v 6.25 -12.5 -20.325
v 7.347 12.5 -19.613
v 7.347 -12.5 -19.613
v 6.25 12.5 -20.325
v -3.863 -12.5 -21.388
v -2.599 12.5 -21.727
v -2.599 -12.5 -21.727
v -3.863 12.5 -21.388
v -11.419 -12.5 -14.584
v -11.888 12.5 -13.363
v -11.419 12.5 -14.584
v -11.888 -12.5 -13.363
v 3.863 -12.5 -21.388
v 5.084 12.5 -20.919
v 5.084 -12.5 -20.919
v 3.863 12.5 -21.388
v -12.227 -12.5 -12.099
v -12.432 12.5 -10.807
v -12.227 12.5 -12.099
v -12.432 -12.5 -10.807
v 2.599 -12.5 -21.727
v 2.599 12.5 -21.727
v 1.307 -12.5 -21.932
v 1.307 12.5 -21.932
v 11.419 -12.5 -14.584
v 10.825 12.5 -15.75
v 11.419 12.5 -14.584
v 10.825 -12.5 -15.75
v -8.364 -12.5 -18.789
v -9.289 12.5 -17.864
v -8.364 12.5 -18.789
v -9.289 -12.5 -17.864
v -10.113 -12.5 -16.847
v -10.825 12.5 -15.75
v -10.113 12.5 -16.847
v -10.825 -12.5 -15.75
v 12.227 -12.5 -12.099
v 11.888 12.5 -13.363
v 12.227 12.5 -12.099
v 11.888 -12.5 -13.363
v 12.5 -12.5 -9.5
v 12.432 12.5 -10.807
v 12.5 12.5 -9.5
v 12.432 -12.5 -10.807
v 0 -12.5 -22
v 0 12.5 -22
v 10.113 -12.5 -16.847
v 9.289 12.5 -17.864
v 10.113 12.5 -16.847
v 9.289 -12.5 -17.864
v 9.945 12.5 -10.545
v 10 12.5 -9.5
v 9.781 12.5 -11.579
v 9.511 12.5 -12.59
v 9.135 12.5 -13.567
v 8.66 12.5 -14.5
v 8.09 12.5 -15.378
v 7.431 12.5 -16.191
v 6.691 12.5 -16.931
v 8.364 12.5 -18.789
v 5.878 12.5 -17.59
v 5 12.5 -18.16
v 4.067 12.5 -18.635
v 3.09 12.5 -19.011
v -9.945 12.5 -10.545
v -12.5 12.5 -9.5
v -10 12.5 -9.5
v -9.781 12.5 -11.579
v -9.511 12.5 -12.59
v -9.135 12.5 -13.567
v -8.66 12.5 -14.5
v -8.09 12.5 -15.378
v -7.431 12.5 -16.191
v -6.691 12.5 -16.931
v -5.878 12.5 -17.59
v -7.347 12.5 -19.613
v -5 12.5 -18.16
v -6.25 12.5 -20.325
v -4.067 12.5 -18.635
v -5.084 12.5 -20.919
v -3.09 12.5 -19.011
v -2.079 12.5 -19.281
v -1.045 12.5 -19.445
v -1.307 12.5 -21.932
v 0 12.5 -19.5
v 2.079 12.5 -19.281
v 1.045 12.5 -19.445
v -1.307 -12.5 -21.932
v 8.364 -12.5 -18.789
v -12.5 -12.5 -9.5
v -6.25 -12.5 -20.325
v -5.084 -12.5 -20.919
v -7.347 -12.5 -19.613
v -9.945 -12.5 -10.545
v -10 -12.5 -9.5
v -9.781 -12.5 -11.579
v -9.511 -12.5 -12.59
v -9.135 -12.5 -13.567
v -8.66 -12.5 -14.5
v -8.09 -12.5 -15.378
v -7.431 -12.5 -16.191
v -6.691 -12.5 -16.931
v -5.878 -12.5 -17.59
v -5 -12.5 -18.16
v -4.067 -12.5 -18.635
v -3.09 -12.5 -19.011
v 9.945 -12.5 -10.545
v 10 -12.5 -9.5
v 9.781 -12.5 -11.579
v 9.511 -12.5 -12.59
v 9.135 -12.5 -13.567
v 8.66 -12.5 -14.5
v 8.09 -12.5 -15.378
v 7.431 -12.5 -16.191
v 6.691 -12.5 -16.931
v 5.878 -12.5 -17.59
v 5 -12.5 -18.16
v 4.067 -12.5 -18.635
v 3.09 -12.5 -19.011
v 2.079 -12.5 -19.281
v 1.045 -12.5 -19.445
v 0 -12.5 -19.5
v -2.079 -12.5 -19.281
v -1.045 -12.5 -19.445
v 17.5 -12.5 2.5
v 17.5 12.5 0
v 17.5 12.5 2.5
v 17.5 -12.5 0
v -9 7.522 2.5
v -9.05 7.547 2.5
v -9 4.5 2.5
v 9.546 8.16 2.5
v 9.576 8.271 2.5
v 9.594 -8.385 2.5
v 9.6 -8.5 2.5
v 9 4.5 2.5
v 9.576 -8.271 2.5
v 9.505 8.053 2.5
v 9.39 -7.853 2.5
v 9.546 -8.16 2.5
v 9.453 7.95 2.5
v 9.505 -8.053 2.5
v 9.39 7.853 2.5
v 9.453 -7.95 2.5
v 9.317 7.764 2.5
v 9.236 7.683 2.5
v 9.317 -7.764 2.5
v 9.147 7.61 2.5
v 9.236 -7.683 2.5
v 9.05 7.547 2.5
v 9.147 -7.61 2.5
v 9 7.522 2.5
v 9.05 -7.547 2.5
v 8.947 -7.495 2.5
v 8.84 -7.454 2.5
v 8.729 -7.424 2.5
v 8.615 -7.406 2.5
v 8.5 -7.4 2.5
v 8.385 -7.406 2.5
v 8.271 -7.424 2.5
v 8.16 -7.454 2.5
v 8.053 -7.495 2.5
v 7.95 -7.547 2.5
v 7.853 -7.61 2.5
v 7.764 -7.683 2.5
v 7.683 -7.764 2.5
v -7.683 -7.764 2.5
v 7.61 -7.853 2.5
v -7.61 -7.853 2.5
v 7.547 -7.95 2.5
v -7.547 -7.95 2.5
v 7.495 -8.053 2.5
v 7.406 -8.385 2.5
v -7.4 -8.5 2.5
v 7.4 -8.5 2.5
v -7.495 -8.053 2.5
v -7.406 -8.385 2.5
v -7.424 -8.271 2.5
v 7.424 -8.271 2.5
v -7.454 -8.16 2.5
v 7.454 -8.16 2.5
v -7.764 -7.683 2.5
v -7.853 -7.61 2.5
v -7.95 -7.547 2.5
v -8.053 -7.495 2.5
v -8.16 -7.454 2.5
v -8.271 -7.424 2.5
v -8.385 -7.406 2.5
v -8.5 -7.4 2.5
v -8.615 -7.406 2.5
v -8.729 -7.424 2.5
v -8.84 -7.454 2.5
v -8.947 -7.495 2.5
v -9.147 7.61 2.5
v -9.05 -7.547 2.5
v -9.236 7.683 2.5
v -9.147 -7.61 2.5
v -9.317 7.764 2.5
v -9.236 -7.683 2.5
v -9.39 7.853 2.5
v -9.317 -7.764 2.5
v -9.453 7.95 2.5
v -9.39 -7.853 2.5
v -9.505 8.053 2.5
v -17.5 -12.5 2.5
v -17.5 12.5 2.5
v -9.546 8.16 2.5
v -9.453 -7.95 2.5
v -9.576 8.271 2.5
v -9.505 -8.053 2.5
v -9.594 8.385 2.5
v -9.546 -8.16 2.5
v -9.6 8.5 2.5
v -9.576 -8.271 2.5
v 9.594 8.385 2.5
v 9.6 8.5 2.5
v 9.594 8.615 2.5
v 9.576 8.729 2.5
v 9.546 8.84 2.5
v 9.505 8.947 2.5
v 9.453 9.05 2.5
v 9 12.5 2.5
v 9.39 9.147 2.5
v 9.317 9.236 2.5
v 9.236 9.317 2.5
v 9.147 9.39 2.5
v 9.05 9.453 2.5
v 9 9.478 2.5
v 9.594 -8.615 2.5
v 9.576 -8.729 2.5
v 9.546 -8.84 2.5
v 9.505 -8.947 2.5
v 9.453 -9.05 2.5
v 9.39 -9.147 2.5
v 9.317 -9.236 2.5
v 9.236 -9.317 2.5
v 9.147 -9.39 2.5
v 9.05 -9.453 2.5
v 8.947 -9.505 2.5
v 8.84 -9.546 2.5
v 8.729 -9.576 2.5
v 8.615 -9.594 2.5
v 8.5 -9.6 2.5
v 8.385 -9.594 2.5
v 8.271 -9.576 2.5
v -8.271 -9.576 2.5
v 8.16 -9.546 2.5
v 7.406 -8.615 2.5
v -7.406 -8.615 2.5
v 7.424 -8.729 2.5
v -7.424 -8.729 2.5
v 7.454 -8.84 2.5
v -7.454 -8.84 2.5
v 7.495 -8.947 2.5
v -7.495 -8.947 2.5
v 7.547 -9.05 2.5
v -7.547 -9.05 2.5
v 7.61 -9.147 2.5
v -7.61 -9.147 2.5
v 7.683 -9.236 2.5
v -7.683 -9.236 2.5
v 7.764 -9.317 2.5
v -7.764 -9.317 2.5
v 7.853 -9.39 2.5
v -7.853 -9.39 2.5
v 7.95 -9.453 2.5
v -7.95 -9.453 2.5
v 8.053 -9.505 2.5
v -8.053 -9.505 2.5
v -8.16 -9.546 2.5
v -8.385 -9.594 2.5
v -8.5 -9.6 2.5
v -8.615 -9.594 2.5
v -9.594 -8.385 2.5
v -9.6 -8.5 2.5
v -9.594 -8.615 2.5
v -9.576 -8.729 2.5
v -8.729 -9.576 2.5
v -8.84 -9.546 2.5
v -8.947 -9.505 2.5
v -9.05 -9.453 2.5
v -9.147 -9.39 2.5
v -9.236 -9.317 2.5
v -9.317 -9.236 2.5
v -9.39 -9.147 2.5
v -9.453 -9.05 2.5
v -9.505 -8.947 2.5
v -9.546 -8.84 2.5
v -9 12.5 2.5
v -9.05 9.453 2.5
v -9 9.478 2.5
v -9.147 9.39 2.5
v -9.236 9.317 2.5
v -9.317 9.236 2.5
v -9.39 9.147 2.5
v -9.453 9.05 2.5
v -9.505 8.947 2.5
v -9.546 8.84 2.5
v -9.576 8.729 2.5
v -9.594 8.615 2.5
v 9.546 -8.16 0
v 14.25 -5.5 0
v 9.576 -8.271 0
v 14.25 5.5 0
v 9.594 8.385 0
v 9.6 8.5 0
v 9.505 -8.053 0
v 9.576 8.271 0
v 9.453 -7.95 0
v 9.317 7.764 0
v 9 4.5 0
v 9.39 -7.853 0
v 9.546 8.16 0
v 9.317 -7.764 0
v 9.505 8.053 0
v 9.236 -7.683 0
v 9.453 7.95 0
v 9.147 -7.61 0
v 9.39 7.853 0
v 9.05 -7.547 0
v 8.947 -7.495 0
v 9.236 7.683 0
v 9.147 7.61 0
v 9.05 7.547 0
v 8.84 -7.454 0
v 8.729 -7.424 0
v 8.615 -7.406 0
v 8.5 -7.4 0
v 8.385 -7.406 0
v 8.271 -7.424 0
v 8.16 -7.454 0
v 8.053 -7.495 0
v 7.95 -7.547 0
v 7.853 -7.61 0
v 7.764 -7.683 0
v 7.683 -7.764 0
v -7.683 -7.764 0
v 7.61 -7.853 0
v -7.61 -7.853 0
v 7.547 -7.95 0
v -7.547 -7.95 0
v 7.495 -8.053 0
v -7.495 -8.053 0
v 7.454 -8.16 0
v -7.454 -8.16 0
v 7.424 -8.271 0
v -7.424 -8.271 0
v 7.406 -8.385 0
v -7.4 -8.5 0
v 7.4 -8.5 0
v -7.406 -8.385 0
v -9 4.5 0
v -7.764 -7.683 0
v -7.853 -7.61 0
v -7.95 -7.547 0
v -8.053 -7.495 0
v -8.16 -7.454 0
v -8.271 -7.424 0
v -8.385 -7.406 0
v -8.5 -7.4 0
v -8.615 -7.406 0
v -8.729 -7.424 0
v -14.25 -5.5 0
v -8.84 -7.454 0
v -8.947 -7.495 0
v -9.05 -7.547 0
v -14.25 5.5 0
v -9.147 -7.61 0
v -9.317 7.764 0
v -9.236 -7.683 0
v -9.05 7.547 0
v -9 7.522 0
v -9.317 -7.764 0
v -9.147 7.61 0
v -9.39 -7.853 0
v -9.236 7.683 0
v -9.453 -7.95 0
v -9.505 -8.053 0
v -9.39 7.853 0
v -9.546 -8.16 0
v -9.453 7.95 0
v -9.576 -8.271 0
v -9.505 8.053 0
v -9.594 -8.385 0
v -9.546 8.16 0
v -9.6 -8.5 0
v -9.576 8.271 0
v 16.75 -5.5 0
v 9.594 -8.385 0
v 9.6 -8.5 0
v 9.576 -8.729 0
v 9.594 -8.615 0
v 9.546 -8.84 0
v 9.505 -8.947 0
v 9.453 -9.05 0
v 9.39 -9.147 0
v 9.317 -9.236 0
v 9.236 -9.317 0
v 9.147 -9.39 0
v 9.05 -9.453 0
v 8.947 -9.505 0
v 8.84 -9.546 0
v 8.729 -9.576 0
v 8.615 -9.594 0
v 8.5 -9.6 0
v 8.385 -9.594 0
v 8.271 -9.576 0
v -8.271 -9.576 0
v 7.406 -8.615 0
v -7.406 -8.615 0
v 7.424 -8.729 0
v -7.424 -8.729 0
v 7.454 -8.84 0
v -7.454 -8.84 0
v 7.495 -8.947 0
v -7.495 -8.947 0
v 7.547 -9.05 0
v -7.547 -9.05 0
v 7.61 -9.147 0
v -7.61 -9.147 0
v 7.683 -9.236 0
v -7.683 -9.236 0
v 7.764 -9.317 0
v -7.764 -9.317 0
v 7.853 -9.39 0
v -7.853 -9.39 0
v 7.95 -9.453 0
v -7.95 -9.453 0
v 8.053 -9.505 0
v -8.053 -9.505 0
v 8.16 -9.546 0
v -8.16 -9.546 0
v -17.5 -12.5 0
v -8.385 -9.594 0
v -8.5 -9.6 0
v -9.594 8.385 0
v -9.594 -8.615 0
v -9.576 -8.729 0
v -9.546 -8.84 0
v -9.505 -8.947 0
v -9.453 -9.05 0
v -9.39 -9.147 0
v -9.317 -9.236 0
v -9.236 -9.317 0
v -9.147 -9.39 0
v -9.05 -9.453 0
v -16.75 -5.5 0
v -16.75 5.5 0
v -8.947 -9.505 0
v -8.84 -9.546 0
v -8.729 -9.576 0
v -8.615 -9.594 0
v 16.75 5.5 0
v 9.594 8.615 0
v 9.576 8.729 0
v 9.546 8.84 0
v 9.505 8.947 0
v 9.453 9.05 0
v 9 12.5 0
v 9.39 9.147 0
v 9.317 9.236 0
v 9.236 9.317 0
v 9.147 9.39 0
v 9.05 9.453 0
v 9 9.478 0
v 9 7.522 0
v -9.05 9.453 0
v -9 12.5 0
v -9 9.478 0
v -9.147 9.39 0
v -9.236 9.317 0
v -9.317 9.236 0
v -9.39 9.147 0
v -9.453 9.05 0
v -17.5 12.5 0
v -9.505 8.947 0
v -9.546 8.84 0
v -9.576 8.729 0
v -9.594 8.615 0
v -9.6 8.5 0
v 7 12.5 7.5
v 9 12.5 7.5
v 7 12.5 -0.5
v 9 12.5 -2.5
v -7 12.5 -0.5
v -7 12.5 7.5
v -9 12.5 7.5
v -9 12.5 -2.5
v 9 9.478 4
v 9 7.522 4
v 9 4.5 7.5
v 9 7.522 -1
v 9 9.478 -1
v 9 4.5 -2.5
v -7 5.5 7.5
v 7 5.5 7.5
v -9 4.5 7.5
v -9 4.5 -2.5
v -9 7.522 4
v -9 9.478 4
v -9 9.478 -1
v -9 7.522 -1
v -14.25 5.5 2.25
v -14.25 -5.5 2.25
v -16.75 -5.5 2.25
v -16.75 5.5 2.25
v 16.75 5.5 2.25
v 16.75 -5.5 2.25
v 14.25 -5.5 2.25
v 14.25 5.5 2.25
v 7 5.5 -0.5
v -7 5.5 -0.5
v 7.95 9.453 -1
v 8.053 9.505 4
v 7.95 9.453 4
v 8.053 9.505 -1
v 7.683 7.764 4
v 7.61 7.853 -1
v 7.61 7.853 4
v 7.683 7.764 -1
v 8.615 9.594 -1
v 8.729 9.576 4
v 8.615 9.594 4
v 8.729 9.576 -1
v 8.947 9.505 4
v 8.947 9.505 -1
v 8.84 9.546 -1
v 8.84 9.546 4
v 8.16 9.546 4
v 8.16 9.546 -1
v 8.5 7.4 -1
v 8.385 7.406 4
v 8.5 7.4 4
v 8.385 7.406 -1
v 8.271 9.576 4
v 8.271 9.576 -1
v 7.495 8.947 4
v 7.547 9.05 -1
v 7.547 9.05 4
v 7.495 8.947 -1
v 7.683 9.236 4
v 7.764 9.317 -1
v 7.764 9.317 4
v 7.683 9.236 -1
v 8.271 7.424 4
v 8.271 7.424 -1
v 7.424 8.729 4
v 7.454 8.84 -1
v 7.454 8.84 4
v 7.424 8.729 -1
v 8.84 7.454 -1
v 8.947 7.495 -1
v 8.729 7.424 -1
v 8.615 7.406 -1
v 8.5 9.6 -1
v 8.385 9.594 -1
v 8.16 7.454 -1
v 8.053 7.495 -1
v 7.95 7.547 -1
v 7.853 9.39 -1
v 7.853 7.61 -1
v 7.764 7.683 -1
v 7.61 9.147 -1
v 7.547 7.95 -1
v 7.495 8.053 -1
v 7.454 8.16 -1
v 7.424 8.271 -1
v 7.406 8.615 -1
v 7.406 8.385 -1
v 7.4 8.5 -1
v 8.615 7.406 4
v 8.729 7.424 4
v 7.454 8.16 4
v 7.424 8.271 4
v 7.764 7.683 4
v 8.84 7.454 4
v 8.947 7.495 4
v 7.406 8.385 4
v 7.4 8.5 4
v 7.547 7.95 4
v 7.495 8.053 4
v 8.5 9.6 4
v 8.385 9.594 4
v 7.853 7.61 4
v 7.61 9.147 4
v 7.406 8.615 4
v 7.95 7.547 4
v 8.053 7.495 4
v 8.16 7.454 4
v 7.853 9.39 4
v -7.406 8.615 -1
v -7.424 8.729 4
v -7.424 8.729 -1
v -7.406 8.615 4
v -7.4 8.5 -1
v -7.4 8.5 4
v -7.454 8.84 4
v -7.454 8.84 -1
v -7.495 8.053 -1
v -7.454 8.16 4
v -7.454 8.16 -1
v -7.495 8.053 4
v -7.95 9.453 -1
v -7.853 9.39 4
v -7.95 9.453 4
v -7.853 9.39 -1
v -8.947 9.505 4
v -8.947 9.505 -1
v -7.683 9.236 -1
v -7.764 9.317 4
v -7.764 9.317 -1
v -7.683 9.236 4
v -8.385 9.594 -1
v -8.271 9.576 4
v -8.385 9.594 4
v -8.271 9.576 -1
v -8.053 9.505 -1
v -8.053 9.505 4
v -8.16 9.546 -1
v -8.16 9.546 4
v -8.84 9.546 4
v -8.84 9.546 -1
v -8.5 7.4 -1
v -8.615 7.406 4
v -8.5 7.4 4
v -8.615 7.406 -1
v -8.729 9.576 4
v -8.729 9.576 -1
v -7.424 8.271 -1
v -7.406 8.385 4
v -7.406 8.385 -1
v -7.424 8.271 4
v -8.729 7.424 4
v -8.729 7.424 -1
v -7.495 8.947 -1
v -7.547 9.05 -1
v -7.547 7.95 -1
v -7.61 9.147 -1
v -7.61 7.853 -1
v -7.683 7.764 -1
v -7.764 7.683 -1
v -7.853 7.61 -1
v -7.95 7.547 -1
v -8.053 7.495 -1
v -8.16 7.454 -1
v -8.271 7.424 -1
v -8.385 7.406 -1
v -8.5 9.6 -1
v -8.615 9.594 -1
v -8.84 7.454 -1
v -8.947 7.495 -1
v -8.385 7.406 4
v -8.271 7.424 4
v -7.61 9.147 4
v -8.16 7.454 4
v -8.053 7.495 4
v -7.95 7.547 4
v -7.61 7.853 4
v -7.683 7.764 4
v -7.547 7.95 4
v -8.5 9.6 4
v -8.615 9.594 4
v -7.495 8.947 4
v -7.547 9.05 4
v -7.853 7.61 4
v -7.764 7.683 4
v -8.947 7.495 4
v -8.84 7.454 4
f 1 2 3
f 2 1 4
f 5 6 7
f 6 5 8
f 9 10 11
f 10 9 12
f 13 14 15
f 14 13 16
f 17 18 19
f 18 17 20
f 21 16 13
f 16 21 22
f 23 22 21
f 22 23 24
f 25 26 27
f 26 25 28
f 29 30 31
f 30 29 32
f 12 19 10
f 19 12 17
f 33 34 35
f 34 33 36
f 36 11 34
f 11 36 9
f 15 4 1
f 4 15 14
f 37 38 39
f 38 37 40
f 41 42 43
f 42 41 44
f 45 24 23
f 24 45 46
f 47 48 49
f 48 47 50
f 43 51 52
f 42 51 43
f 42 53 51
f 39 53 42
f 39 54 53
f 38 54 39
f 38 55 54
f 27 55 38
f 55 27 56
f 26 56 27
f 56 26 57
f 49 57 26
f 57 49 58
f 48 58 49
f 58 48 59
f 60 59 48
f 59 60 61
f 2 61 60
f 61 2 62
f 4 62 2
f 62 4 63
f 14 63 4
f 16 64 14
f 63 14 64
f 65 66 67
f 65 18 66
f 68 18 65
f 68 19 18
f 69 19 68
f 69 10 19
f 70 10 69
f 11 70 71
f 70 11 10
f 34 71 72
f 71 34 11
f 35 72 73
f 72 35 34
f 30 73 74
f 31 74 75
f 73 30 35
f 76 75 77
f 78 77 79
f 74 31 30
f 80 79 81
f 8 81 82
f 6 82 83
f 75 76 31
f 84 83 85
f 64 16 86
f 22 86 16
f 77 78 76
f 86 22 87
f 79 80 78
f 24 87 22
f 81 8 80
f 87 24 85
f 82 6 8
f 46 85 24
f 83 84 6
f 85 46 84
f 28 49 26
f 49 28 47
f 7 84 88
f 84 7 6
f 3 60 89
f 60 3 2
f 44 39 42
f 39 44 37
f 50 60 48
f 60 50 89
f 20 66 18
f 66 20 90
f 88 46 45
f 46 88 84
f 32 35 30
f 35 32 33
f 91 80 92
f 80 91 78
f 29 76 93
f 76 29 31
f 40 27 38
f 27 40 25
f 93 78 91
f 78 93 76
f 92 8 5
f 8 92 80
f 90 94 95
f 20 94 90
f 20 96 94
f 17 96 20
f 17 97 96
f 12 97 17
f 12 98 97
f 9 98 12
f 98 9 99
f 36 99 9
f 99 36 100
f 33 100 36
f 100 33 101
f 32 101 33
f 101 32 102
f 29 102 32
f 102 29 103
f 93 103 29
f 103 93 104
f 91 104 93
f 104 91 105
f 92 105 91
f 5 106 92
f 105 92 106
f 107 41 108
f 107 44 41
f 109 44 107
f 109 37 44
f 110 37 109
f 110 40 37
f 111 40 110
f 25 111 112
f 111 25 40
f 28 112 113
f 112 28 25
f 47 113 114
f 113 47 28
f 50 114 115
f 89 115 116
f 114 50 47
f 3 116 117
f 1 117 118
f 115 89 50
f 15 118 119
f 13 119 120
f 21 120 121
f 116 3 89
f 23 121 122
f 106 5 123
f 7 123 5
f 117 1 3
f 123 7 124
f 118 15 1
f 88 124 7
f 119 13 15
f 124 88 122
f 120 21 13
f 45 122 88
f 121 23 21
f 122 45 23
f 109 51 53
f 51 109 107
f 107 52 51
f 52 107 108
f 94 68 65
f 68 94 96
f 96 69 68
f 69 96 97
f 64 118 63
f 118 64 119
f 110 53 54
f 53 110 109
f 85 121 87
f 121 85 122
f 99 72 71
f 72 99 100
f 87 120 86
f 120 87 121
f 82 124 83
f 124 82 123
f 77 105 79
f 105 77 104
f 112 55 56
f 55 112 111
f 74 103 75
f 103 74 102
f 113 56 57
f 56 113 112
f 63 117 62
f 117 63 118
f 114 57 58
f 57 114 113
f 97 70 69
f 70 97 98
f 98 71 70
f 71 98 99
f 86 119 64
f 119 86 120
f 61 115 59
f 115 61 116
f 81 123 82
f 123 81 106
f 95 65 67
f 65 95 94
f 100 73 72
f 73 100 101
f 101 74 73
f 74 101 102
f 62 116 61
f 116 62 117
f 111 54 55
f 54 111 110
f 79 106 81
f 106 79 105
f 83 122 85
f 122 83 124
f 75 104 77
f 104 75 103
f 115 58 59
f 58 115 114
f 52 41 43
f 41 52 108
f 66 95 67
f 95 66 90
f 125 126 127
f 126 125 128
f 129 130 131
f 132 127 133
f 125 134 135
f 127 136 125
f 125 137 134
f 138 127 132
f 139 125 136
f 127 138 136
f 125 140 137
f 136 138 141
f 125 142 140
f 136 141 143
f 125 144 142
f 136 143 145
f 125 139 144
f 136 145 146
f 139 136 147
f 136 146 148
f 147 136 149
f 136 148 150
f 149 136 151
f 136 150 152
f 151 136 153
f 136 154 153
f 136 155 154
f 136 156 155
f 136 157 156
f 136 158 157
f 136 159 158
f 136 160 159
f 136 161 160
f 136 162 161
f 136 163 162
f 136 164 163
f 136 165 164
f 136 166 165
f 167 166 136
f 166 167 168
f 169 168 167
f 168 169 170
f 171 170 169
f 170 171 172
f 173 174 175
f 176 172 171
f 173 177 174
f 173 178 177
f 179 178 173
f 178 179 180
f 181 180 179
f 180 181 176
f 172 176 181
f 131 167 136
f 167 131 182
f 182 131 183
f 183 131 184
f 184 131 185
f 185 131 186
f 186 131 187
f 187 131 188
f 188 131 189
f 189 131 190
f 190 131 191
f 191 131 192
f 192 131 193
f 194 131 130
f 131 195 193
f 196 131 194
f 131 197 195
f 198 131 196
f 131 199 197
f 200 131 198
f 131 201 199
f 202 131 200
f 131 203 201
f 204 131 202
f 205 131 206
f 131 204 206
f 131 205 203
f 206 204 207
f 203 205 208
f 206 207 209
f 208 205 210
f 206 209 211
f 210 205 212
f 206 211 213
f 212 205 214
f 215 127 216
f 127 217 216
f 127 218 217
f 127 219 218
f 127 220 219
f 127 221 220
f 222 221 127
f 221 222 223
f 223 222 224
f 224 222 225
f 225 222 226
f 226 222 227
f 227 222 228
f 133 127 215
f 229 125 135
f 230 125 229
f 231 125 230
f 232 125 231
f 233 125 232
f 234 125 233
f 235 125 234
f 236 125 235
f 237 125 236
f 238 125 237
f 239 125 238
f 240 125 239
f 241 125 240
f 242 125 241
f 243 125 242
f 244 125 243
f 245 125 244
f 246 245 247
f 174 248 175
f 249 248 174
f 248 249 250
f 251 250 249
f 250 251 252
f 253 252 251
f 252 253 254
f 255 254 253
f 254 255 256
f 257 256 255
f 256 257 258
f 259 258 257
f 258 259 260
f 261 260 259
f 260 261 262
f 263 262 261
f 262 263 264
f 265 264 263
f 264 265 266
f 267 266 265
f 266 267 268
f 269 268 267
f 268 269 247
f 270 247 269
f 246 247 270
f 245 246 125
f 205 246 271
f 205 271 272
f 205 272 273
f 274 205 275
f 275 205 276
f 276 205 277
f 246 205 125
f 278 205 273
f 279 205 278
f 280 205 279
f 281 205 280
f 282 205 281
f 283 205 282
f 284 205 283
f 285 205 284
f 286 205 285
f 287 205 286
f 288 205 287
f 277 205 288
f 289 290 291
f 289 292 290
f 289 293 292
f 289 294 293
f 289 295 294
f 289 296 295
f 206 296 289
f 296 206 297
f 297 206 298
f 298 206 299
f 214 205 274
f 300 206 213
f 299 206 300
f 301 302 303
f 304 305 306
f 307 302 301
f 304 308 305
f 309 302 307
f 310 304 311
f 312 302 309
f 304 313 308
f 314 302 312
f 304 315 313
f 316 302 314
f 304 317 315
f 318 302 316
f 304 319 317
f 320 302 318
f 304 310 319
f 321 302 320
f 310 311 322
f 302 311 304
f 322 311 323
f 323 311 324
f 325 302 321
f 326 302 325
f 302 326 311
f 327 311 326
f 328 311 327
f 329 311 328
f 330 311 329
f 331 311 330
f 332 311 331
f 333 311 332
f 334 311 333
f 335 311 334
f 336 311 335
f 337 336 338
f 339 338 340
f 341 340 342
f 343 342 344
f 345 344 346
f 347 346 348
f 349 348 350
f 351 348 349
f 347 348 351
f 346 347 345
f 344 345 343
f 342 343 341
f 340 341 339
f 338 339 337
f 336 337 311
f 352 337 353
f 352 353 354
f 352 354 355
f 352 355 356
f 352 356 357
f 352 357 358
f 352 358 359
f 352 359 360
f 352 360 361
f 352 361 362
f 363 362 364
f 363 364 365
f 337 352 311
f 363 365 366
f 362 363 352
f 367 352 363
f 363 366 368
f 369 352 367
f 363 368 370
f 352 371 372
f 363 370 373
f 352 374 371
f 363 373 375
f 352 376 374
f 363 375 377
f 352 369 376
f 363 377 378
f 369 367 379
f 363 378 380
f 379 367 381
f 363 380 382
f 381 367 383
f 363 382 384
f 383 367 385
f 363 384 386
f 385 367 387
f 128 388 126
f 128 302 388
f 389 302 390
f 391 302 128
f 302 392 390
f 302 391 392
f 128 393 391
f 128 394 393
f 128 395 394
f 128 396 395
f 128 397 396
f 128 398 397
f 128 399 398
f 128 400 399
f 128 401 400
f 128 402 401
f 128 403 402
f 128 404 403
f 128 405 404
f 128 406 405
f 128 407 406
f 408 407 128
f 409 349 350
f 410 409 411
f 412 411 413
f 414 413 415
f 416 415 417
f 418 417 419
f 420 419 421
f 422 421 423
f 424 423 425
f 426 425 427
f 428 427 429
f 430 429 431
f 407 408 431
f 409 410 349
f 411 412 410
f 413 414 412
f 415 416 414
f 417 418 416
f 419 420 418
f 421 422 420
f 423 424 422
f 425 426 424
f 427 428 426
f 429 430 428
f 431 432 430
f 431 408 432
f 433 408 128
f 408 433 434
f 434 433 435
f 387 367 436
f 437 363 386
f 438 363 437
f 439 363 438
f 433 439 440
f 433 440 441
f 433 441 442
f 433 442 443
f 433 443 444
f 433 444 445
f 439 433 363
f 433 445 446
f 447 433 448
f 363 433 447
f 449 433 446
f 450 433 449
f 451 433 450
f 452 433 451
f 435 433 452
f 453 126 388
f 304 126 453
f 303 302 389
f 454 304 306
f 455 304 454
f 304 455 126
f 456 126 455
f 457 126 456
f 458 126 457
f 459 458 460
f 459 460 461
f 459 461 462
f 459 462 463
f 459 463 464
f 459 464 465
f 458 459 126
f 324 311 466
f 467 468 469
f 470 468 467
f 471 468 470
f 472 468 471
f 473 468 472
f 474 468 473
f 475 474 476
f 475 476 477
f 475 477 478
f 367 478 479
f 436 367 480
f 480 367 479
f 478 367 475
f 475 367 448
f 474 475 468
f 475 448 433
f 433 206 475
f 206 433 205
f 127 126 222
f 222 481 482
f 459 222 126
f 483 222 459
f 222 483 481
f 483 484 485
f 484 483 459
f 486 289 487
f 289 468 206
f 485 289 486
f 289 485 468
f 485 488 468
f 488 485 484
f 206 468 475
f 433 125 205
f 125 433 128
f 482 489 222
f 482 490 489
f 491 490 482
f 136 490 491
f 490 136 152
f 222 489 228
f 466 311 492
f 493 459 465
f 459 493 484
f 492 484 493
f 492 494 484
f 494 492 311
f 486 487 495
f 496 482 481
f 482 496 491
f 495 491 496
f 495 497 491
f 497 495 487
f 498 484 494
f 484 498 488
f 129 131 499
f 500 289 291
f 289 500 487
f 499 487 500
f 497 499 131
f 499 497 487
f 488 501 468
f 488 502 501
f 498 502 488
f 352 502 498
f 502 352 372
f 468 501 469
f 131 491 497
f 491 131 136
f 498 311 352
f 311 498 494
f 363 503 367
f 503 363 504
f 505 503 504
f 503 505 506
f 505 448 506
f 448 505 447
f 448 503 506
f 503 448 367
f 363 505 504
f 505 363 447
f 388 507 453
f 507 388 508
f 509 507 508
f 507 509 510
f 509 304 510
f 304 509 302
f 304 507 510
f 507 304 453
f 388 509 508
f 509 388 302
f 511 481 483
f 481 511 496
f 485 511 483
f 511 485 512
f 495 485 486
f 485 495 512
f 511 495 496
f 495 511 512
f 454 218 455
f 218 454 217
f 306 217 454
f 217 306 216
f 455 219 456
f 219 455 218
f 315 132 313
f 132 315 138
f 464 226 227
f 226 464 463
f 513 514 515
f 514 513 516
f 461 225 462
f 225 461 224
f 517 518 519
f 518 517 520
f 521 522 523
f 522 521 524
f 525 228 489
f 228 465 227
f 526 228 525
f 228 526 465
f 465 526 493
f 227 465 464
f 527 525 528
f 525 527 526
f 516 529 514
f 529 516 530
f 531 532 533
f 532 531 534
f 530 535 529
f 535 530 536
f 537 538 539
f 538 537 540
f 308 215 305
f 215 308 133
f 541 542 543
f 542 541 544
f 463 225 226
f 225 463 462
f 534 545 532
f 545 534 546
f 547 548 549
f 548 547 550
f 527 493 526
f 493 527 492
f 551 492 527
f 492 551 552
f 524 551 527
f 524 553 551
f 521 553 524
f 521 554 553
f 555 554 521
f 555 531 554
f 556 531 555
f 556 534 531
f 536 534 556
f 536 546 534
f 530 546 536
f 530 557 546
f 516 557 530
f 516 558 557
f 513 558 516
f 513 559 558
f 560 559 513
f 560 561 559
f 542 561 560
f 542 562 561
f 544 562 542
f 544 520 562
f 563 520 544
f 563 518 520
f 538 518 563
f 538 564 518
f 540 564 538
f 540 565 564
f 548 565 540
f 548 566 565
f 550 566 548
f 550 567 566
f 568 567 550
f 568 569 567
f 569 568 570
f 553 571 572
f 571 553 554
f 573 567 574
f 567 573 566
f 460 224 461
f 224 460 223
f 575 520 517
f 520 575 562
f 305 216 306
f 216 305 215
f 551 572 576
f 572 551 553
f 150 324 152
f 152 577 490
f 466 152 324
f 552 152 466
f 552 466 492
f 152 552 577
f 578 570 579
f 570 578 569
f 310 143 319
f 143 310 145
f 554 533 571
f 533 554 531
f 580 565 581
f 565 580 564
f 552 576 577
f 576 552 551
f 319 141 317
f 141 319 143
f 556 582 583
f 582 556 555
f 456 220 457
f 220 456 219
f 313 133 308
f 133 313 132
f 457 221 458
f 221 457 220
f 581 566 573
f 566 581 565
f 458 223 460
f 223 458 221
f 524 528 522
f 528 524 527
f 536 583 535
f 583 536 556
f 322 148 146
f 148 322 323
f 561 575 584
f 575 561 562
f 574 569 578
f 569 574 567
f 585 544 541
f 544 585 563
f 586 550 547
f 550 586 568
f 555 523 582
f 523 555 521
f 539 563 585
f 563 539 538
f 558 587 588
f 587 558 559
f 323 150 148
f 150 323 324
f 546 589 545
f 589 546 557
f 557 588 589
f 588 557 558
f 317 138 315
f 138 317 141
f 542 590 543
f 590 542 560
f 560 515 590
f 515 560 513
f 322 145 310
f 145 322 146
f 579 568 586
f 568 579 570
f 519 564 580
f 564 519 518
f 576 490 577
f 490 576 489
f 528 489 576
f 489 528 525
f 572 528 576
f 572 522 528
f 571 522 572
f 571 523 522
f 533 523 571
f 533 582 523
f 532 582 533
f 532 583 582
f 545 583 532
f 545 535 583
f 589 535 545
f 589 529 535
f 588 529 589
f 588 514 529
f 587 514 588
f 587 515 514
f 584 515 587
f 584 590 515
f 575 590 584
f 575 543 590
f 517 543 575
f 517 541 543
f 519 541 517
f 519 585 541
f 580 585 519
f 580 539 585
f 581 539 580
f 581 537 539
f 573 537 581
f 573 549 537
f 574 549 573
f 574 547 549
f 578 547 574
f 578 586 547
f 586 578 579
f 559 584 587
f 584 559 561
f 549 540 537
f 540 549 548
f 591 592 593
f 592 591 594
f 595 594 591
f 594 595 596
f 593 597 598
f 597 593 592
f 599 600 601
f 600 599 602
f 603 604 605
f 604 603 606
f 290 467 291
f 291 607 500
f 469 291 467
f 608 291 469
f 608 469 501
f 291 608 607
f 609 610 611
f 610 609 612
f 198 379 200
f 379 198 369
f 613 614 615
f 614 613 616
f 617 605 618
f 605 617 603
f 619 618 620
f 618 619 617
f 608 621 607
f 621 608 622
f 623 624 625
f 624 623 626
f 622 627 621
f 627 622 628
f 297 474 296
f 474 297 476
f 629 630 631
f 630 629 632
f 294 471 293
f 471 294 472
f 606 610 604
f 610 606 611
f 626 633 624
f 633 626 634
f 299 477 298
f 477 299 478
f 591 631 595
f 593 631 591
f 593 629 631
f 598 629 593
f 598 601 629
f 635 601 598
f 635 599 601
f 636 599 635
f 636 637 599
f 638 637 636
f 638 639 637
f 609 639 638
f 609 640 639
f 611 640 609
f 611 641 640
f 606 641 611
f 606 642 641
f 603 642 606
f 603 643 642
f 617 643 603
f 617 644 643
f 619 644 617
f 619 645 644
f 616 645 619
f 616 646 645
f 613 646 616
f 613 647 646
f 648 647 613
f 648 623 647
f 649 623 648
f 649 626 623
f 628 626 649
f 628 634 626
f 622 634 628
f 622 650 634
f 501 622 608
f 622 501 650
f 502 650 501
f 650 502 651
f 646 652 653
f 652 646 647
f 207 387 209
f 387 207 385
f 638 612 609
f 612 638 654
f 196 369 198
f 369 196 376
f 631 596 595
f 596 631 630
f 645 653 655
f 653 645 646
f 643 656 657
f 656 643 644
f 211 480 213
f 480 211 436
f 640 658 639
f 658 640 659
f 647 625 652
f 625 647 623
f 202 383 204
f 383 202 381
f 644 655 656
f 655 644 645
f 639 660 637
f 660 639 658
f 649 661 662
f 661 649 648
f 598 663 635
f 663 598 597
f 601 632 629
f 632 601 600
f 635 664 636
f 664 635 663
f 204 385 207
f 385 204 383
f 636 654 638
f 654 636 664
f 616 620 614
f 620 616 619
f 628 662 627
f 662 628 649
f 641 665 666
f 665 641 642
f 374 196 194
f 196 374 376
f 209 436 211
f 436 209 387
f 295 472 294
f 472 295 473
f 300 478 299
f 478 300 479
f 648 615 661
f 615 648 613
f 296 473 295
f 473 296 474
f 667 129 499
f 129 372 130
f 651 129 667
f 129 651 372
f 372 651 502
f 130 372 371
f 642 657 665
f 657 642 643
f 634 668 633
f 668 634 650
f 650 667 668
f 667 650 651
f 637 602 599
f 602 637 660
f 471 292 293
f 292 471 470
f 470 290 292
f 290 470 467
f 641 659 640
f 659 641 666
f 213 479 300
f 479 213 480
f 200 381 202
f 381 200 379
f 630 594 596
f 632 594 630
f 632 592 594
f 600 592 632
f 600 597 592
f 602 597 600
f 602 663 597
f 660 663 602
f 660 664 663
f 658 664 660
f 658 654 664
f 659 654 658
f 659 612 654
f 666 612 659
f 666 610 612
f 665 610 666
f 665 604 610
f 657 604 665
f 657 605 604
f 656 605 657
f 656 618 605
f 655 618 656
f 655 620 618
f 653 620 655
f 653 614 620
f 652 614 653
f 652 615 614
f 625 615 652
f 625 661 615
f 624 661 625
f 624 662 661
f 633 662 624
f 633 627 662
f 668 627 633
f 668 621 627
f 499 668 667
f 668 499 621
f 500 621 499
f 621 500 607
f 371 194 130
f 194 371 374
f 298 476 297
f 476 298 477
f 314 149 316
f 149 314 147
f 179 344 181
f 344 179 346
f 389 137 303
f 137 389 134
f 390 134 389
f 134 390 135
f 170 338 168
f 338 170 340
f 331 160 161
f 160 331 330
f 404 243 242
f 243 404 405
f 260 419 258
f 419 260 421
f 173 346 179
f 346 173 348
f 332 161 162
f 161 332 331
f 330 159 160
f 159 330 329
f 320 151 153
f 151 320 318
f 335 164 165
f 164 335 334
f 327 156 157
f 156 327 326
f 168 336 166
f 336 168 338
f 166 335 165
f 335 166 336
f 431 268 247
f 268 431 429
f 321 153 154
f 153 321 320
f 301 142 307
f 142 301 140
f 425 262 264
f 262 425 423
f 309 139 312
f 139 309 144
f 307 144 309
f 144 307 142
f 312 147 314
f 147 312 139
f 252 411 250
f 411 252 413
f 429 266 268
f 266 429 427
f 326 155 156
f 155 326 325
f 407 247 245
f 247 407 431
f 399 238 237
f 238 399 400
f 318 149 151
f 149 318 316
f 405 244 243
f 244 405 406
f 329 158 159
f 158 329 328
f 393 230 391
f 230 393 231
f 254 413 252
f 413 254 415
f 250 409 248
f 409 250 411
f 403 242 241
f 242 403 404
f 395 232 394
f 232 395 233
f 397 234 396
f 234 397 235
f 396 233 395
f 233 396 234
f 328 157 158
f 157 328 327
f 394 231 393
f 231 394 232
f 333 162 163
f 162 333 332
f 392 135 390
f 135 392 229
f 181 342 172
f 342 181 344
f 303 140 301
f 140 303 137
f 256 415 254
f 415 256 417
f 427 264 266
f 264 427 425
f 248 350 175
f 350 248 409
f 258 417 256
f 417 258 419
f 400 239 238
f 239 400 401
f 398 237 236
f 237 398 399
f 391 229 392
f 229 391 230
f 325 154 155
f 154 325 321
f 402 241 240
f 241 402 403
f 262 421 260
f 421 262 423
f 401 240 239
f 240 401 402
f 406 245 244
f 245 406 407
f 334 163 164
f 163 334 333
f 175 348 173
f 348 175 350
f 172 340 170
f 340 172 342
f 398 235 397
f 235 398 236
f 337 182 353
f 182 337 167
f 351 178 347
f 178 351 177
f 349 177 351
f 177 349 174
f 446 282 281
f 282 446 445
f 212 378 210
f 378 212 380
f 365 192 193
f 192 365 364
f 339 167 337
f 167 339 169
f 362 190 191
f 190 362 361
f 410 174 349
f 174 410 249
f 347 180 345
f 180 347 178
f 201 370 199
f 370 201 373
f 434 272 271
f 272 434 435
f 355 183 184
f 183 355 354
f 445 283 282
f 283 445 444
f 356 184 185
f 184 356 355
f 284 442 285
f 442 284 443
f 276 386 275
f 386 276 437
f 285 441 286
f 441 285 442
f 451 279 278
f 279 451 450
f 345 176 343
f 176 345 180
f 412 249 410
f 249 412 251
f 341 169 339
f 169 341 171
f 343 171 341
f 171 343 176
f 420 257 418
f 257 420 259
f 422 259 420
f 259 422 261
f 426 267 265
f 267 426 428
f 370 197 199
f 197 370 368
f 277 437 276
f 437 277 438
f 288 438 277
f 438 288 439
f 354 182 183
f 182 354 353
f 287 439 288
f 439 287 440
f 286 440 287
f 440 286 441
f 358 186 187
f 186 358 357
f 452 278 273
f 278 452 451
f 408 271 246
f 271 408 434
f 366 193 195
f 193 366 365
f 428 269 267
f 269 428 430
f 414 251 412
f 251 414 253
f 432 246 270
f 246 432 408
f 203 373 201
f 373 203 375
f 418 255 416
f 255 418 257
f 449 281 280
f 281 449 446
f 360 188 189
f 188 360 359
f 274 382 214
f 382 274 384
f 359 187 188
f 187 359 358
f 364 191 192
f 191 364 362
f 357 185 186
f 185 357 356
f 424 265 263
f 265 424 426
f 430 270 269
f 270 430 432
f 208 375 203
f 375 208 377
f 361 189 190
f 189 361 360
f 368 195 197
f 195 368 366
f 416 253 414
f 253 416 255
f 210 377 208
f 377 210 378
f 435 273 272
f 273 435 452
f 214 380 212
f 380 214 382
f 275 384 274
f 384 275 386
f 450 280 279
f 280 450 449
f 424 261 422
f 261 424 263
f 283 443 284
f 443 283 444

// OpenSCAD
// M5Stack Haptic Unit Finger Saddle
// Designed for 10mm Velcro straps

$fn = 60;

unit_w = 25; // M5Stack unit width + tolerance
unit_l = 25;
strap_w = 11; // 10mm velcro strap slot
thickness = 2.5;
finger_rad = 10; // Radius for an average adult index finger
cover_h = 10; // Height of the protective cover

difference() {
    union() {
        // Main Base Plate
        translate([-unit_w/2 - 5, -unit_l/2, 0])
            cube([unit_w + 10, unit_l, thickness]);
        
        // Finger Saddle (Curved Bottom)
        translate([0, 0, -finger_rad + 0.5])
            rotate([90, 0, 0])
            difference() {
                cylinder(r = finger_rad + thickness, h = unit_l, center = true);
                cylinder(r = finger_rad, h = unit_l + 2, center = true);
                // Cut top half
                translate([0, finger_rad, 0])
                    cube([finger_rad*3, finger_rad*2, unit_l + 4], center = true);
            }
            
        // Protective Cover Hood
        translate([0, unit_l/2 - 4, thickness])
            cube([18, 8, cover_h], center = true);
    }

    // Strap Slots (Left and Right)
    translate([-unit_w/2 - 3, 0, 0])
        cube([2.5, strap_w, thickness + 2], center = true);
    translate([unit_w/2 + 3, 0, 0])
        cube([2.5, strap_w, thickness + 2], center = true);
        
    // Hollow out the cover for the connector
    translate([0, unit_l/2 - 2, thickness + 2])
        cube([14, 10, cover_h], center = true);

    // Cable exit hole
    translate([0, unit_l/2 + 2, thickness])
        cube([10, 5, 6], center = true);

    // Screw Hole Markers (M2 standard for M5Stack)
    translate([unit_w/2 - 4, unit_l/2 - 4, -1]) cylinder(d=2.2, h=5);
    translate([-unit_w/2 + 4, unit_l/2 - 4, -1]) cylinder(d=2.2, h=5);
    translate([unit_w/2 - 4, -unit_l/2 + 4, -1]) cylinder(d=2.2, h=5);
    translate([-unit_w/2 + 4, -unit_l/2 + 4, -1]) cylinder(d=2.2, h=5);
}
